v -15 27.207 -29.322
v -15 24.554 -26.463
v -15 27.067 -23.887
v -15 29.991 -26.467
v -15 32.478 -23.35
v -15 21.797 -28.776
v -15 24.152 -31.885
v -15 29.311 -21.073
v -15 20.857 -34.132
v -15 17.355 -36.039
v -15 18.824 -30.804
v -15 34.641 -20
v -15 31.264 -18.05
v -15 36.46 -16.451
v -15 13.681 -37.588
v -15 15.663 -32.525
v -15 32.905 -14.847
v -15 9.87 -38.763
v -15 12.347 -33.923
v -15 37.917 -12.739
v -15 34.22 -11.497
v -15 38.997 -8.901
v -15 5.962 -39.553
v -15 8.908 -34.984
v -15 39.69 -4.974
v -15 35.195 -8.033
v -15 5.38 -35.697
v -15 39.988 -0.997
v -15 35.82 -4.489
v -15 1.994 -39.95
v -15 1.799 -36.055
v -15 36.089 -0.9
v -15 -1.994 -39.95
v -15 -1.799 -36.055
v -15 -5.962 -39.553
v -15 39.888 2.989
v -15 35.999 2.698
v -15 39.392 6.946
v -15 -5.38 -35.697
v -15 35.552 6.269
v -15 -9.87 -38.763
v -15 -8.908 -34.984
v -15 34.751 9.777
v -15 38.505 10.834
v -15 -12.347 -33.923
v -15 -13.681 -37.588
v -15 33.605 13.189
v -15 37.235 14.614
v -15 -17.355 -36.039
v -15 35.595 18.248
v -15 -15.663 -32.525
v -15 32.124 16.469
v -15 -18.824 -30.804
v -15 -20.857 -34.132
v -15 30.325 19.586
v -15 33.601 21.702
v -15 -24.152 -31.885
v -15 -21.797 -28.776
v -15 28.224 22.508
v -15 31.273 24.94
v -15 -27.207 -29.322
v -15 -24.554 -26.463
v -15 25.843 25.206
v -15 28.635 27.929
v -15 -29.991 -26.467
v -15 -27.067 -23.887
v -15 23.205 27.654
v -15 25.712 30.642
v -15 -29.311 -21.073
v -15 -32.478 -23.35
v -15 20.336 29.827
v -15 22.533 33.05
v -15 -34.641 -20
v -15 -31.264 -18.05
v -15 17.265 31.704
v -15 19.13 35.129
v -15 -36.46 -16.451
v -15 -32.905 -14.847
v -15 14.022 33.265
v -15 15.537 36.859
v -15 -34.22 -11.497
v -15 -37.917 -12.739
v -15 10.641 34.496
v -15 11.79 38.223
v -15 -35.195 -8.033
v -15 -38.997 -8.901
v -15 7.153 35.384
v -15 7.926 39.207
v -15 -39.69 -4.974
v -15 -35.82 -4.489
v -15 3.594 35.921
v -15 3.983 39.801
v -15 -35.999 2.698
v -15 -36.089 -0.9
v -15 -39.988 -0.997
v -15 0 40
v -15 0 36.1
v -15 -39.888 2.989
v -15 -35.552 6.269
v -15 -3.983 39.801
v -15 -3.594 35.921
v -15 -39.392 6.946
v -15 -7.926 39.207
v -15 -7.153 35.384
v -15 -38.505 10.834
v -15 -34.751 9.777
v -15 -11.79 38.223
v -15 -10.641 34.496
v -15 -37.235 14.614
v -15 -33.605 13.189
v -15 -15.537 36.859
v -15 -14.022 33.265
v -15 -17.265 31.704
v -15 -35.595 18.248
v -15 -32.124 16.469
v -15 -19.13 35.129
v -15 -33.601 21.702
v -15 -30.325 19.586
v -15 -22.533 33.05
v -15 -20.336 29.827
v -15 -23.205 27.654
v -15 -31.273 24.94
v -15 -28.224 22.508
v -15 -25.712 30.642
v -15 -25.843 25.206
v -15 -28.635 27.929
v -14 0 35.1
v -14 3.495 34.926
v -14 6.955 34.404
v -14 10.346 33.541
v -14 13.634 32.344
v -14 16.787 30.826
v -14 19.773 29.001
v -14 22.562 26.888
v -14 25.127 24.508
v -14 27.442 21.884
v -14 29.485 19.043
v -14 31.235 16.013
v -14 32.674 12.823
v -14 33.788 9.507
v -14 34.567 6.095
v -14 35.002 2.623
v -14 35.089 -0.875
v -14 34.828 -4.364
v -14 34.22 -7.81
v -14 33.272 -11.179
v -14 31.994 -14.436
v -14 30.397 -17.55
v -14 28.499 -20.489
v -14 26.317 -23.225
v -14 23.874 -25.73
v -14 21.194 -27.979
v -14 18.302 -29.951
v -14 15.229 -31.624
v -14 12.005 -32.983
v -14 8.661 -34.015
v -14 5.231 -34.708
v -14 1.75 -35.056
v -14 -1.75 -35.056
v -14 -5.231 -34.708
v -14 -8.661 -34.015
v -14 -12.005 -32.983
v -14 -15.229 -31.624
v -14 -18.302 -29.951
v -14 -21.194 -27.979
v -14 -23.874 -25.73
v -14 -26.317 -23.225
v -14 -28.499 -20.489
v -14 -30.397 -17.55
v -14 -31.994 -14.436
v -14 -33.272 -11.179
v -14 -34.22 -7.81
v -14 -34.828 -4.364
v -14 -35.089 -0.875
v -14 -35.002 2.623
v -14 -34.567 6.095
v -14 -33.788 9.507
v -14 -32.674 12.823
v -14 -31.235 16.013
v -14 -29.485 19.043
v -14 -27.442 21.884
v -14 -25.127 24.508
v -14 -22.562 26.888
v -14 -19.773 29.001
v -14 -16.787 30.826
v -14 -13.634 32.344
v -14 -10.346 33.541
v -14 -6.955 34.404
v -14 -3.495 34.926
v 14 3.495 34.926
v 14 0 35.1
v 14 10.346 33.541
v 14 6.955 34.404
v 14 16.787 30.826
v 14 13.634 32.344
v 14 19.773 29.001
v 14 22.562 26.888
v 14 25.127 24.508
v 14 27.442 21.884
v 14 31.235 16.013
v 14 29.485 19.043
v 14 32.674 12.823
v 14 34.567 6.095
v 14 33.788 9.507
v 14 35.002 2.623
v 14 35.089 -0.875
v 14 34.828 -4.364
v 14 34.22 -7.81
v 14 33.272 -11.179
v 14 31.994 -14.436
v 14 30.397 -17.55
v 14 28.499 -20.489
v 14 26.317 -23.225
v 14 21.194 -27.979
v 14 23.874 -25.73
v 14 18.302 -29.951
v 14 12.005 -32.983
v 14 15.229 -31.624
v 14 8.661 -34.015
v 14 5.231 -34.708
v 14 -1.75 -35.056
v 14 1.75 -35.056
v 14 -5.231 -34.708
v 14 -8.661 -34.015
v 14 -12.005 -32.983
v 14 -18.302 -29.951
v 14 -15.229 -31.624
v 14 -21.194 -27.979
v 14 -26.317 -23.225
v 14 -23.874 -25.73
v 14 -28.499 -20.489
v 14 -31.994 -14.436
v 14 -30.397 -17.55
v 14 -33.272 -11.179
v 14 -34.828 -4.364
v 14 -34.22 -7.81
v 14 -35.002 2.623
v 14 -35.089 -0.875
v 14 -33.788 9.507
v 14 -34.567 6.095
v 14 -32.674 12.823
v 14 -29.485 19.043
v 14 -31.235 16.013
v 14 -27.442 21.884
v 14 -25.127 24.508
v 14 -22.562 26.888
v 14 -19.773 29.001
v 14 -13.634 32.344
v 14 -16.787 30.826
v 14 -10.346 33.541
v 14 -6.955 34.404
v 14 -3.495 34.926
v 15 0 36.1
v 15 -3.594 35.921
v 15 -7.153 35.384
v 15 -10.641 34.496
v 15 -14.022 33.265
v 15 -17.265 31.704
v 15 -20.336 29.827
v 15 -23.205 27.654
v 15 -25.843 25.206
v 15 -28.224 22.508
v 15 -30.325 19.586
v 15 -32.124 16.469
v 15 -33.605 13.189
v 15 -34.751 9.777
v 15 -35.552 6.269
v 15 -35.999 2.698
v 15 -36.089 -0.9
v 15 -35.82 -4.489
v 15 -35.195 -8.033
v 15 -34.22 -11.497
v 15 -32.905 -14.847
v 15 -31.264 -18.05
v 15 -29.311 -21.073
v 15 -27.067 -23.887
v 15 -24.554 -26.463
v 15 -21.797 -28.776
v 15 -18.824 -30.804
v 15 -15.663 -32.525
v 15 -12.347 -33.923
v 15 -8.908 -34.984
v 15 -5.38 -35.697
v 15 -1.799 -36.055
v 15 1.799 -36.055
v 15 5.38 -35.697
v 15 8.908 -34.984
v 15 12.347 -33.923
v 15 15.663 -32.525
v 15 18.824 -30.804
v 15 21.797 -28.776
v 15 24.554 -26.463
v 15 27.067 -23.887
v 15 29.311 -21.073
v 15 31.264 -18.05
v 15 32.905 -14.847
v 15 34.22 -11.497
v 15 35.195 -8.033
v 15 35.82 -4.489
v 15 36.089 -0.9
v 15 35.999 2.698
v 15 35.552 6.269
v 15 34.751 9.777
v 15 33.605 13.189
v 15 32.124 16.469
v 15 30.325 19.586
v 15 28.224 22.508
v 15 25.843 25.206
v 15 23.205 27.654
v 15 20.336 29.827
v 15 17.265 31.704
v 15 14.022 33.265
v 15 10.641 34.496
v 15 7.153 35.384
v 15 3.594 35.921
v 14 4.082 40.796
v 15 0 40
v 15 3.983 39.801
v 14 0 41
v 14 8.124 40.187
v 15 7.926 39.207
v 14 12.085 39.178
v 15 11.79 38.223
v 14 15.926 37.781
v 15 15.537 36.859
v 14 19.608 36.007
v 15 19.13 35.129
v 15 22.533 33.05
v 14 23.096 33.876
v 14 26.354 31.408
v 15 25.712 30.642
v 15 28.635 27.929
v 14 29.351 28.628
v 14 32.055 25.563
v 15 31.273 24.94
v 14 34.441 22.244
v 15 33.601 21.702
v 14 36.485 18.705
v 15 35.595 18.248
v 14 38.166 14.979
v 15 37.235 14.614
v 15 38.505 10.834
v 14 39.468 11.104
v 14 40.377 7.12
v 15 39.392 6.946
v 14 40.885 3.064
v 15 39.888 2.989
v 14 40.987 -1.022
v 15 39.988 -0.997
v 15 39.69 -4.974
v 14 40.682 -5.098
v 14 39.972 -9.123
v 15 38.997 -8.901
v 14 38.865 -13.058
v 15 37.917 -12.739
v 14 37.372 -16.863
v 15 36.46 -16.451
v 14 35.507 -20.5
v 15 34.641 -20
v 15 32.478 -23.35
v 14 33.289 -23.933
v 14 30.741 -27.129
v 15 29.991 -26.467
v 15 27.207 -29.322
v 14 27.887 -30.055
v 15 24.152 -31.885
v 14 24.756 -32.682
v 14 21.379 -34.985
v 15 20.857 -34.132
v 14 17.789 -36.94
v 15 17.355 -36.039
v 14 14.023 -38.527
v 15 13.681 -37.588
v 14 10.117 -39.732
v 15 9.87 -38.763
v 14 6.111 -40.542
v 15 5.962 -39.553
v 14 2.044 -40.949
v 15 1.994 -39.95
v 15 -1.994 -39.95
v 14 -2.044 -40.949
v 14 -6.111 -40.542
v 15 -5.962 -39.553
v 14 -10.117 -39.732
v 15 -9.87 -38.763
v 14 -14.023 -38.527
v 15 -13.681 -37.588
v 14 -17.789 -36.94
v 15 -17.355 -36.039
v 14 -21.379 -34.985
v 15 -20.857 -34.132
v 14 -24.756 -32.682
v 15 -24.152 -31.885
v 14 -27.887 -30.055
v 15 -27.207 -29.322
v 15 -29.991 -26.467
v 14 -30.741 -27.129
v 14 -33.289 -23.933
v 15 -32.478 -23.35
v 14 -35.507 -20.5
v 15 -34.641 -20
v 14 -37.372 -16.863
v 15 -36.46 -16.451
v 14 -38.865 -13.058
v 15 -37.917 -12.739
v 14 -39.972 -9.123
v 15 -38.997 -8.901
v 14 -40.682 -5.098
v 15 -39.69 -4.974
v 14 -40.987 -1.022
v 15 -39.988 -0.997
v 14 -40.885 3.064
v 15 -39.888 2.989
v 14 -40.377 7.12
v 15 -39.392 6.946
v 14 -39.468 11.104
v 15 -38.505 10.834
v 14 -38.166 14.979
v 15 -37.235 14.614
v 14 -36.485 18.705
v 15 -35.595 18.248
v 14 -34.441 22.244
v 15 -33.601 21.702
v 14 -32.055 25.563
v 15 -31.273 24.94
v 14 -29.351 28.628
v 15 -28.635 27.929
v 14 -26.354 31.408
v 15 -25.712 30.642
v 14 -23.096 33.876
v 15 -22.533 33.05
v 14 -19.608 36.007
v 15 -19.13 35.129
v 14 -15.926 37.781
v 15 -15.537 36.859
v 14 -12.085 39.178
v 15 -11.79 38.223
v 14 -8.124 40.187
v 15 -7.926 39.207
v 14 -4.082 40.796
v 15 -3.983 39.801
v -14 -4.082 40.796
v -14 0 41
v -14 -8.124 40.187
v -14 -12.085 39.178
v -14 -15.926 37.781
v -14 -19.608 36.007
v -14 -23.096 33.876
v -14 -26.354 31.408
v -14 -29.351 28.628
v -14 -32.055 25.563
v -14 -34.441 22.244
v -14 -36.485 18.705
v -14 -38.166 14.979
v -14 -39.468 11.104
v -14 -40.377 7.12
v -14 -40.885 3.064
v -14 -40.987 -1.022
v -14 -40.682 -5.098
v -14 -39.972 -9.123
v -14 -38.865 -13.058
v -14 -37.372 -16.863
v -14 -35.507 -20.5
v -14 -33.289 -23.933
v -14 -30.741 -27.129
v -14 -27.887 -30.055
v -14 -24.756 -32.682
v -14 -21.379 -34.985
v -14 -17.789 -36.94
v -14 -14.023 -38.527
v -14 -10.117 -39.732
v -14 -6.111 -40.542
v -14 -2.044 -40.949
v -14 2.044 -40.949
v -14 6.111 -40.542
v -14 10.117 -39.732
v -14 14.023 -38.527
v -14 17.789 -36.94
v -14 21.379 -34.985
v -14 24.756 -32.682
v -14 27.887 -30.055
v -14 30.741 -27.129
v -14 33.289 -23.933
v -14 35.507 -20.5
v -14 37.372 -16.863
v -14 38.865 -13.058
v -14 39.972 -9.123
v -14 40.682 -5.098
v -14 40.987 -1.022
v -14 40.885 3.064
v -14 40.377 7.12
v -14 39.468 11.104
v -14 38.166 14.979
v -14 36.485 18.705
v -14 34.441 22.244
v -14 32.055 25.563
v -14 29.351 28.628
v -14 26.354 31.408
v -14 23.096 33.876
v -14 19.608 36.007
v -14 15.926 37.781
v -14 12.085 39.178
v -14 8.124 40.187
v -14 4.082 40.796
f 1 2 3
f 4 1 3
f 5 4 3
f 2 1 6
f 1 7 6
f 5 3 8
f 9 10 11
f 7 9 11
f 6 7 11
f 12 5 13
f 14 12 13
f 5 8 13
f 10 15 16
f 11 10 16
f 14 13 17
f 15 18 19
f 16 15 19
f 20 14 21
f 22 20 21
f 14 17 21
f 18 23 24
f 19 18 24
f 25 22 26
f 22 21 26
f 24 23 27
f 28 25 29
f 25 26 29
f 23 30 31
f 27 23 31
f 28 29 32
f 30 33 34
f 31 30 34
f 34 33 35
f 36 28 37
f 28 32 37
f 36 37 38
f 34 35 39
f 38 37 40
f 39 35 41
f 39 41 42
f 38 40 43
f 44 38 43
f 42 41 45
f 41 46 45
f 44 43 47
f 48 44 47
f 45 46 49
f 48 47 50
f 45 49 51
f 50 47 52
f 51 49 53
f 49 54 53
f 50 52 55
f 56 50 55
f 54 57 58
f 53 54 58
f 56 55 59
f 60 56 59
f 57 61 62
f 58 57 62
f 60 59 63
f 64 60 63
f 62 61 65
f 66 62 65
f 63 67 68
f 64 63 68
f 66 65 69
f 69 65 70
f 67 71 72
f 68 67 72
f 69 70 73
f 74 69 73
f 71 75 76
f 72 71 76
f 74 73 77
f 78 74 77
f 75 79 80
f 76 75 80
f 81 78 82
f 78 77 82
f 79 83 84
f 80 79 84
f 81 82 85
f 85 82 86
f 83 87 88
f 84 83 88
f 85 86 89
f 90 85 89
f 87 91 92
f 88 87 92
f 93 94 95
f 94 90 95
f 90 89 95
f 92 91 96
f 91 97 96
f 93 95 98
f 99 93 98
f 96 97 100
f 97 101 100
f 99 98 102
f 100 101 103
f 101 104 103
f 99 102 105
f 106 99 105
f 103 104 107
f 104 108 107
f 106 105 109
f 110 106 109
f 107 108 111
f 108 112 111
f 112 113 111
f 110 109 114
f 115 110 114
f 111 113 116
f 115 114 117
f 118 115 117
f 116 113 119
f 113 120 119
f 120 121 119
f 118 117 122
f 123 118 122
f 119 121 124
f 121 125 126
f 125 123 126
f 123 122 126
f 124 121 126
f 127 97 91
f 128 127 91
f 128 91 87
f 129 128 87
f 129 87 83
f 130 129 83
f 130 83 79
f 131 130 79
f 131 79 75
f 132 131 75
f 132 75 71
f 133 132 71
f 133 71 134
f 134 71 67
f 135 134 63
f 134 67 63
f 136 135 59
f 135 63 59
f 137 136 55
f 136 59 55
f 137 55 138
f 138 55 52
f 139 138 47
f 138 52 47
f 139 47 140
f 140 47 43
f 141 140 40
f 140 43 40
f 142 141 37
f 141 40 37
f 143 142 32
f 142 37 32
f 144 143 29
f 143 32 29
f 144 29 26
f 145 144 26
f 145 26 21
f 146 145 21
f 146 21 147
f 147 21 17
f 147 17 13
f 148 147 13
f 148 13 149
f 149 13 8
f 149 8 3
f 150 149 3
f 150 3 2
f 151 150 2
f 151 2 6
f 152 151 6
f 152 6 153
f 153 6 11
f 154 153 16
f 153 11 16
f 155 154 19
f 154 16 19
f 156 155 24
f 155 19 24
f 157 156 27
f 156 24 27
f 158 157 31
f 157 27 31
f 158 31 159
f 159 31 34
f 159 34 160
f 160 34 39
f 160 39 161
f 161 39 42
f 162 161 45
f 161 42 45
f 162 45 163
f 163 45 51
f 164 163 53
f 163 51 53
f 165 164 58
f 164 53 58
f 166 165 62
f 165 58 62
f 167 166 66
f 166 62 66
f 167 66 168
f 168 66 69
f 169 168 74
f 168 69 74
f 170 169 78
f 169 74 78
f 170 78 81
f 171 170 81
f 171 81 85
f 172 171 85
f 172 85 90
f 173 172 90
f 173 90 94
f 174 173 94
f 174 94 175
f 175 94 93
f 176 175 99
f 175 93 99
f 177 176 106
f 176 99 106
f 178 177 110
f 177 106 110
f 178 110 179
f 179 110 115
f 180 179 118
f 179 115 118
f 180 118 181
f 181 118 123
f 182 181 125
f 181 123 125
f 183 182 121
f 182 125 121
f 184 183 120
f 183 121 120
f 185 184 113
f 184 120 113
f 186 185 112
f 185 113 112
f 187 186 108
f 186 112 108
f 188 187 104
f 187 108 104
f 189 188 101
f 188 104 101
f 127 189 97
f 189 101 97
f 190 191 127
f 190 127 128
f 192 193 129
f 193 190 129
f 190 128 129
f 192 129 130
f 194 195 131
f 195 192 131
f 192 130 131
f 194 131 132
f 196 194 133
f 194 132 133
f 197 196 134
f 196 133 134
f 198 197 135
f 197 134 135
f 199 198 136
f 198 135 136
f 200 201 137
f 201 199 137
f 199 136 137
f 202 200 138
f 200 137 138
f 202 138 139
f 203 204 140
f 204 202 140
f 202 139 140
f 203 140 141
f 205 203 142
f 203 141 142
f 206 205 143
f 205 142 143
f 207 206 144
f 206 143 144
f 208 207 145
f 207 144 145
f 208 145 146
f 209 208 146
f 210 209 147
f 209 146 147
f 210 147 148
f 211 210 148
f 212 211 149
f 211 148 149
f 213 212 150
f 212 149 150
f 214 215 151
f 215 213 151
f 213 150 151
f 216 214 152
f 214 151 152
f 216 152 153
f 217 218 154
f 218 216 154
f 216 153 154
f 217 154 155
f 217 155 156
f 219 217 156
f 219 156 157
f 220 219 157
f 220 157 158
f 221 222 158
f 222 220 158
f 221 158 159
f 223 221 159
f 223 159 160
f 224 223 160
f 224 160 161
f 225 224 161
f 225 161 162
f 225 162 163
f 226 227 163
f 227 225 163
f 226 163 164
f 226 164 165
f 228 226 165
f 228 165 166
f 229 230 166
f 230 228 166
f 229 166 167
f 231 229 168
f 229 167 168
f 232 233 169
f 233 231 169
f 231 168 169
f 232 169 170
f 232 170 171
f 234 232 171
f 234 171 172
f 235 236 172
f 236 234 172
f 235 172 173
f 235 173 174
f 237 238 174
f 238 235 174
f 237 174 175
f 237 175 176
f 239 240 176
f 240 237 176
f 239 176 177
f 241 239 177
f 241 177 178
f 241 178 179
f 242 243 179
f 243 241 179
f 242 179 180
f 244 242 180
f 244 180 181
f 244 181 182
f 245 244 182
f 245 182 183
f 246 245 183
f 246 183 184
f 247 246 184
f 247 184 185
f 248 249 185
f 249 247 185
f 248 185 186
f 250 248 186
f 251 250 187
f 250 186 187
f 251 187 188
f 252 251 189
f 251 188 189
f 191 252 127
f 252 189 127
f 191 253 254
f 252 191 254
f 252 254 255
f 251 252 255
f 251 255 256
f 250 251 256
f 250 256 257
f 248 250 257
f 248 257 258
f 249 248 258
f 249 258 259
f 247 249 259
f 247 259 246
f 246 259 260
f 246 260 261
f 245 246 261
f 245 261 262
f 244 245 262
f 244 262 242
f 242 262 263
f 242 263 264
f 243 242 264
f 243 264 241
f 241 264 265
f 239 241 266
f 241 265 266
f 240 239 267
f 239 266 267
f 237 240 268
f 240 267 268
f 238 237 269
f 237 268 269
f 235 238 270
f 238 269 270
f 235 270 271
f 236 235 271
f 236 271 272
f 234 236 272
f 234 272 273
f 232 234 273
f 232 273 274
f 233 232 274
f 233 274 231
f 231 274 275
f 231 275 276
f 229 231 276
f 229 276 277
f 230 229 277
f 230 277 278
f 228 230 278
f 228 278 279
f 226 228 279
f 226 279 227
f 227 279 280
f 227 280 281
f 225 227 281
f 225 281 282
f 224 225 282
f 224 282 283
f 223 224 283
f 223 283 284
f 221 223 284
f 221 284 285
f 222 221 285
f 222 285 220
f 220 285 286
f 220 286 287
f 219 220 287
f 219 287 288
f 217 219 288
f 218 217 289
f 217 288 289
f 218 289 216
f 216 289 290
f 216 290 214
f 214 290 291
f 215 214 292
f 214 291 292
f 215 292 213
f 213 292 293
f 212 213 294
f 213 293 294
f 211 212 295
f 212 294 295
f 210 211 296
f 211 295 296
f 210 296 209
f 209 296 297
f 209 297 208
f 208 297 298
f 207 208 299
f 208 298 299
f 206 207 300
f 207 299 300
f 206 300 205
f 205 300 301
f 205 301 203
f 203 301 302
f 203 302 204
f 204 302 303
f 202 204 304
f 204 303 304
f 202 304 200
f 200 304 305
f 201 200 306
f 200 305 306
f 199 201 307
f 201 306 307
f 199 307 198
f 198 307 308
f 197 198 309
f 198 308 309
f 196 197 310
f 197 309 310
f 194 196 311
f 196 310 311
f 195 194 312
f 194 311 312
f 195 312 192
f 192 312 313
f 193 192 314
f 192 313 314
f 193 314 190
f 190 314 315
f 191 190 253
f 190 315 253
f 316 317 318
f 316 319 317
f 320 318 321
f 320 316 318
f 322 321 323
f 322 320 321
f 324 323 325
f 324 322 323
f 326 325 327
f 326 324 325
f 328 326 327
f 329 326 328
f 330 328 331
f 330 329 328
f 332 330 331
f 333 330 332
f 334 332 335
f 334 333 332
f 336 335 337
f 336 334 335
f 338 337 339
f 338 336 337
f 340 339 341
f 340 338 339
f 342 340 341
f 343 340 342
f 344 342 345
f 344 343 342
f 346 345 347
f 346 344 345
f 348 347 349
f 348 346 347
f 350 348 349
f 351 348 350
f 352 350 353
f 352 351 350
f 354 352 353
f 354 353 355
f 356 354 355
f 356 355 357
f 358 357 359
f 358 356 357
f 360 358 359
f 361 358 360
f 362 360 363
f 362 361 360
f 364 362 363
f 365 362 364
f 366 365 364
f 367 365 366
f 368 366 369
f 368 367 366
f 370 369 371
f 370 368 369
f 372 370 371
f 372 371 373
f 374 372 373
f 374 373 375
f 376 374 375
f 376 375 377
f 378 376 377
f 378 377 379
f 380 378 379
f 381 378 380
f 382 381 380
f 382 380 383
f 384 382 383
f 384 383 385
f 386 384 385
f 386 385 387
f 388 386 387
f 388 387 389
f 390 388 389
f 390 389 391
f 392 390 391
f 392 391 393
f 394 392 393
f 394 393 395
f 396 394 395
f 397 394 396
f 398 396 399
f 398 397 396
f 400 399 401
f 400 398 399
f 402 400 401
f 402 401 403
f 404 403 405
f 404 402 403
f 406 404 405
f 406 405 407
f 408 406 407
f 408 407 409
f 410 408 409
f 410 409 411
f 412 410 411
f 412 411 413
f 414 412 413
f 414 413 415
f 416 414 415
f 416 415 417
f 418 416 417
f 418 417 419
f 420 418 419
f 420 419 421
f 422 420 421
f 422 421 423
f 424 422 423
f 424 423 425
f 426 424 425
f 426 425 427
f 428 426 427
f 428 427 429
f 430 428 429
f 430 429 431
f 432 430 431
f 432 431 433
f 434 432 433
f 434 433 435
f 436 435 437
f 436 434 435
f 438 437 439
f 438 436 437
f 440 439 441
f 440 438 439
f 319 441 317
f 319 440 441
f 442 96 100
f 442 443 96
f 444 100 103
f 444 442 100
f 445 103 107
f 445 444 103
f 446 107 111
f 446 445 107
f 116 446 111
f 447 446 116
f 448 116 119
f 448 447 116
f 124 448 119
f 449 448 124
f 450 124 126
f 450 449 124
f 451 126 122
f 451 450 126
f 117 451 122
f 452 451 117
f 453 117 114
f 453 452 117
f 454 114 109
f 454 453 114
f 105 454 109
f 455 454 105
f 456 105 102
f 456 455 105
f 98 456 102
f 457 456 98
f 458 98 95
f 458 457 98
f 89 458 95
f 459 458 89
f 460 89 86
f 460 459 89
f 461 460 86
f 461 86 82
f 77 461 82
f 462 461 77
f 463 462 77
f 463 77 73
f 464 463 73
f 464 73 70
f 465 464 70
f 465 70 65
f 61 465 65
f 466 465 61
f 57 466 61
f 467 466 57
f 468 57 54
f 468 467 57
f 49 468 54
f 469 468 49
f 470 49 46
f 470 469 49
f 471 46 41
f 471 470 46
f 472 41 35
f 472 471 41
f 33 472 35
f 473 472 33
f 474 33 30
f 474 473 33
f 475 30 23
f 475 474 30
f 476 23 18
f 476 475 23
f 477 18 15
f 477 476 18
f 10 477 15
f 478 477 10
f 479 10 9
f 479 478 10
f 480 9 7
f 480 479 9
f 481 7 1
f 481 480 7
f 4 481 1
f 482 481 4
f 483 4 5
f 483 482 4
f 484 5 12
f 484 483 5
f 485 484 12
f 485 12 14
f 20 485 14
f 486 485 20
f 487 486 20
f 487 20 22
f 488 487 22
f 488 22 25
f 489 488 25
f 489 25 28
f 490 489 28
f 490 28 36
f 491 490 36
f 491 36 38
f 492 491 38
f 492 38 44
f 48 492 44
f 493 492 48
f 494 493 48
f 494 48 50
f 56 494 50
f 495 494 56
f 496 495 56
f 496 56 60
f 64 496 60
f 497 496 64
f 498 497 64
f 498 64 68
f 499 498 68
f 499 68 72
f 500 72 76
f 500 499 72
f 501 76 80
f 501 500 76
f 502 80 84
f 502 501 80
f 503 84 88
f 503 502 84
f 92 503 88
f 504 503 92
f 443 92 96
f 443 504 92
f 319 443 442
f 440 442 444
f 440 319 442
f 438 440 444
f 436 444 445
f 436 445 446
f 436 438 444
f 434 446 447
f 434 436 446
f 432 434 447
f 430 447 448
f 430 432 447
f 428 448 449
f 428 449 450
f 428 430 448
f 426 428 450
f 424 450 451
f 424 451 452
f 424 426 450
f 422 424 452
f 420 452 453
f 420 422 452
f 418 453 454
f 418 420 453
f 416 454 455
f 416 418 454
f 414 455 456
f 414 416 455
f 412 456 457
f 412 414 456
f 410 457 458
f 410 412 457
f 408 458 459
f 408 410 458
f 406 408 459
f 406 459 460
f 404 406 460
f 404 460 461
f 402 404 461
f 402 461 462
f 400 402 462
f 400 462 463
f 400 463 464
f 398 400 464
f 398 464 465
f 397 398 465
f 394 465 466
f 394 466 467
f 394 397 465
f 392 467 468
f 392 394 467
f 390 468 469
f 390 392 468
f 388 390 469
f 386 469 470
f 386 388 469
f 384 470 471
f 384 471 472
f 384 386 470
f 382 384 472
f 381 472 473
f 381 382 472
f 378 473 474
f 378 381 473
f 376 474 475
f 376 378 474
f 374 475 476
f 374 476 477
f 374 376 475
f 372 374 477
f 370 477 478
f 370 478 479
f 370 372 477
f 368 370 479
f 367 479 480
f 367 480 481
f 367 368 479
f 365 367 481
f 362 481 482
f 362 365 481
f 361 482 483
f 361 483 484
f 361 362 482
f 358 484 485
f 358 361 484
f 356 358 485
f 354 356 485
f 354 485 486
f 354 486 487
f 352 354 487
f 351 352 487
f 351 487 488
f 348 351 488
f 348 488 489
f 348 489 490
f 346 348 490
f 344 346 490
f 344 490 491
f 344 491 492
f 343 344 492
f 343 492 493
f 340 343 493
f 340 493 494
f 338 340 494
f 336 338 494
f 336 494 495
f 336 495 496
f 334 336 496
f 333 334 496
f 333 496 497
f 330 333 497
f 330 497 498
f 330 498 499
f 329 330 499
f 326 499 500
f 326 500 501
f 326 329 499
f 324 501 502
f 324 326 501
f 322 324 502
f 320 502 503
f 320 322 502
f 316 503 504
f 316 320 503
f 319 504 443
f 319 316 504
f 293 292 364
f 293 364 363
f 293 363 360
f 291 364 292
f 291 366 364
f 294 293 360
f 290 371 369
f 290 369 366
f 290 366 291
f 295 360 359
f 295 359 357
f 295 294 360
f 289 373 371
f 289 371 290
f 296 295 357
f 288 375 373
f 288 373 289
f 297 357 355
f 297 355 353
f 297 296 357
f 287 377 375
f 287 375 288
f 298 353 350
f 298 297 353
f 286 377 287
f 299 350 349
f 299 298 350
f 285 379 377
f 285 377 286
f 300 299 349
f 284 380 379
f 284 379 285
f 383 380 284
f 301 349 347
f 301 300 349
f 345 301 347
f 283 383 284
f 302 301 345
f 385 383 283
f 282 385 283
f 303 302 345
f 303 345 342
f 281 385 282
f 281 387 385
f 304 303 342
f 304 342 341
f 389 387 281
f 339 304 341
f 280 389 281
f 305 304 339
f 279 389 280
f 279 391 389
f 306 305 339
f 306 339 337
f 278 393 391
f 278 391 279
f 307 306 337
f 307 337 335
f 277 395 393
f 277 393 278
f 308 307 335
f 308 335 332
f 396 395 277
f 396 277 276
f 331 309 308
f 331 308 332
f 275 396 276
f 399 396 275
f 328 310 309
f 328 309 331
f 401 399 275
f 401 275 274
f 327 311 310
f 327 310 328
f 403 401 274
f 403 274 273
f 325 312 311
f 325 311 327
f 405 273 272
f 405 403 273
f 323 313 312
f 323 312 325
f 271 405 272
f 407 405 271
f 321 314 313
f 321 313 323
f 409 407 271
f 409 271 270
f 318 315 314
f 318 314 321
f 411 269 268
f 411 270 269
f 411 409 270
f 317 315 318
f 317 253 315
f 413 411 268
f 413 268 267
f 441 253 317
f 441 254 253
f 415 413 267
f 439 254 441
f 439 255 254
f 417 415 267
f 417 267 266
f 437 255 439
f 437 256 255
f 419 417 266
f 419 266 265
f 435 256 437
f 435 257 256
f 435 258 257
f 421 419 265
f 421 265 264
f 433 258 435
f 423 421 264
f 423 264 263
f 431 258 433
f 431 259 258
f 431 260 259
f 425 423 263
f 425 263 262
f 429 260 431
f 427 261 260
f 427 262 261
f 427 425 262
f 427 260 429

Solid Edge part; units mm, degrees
sketch "Sketch1" plane through (0, 0, 0) normal (0, -1, 0) x (1, 0, 0)
  line L0 (-15, 41) -> (15, 41)
  line L1 (15, 41) -> (15, 35.1)
  line L2 (15, 35.1) -> (-15, 35.1)
  line L3 (-15, 35.1) -> (-15, 41)
  dimension "D1" = 30
revolve "RevolvedProtrusion1" add sketch "Sketch1" angle 360 about axis through (-60, 0, 0) along (1, 0, 0)
chamfer "Chamfer1" distance 1 angle 45 4 edges at (15, 0, -35.1) (15, 0, -41) (-15, 0, -41) (-15, 0, -35.1)
properties material "Polypropylene, general purpose"
